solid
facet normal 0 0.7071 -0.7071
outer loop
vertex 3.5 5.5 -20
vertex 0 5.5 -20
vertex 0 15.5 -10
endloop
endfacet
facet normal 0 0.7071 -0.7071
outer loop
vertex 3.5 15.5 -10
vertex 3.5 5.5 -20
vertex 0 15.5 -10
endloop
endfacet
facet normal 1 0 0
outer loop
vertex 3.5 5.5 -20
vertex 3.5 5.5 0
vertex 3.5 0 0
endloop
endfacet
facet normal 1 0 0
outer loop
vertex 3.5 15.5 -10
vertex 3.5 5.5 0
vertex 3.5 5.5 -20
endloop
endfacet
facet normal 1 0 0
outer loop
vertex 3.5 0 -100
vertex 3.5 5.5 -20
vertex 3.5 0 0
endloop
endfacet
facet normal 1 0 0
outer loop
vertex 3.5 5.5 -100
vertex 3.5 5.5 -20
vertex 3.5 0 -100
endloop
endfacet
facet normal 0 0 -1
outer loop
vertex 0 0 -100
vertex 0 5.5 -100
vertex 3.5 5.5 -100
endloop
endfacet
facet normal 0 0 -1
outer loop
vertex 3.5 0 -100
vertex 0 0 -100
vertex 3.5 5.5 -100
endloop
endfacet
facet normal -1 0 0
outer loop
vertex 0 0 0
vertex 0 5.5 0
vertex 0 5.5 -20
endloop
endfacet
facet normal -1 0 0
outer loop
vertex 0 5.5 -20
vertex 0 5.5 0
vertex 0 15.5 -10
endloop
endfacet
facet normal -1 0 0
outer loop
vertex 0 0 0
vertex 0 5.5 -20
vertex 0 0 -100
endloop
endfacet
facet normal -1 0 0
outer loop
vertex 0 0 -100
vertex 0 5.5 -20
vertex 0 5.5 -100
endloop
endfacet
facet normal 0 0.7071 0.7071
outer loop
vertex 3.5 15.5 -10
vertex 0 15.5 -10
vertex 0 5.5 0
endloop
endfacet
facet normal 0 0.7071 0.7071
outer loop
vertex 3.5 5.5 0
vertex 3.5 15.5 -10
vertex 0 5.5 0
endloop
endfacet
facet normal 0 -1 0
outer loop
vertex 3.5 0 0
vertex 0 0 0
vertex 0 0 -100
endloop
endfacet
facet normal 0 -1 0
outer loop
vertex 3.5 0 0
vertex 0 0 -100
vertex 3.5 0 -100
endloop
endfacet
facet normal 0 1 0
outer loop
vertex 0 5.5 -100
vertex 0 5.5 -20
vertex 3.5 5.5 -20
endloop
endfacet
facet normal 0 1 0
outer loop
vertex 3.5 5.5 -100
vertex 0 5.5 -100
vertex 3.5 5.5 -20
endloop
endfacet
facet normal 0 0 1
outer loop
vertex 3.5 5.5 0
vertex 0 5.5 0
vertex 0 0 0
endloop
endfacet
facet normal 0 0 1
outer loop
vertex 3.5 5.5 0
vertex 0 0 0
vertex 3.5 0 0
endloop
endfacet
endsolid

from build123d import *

# Parameters (mm, degrees)
ESQUISSE1_W        = 3.5
ESQUISSE1_H        = 5.5
BOSS_EXTRU_1_DEPTH = 100
BOSS_EXTRU_2_DEPTH = 3.5


with BuildPart() as part:
    # Esquisse1 → Boss.-Extru.1 (new body)
    with BuildSketch(Plane.XY):
        with Locations((1.75, 2.75)):
            Rectangle(ESQUISSE1_W, ESQUISSE1_H)
    extrude(amount=-BOSS_EXTRU_1_DEPTH)

    # Esquisse2 → Boss.-Extru.2 (add)
    with BuildSketch(Plane.ZY):
        Polygon((0, 5.5), (-10, 5.5), (-20, 5.5), (-10, 15.5), align=None)
    extrude(amount=-BOSS_EXTRU_2_DEPTH)


solid = part.part
